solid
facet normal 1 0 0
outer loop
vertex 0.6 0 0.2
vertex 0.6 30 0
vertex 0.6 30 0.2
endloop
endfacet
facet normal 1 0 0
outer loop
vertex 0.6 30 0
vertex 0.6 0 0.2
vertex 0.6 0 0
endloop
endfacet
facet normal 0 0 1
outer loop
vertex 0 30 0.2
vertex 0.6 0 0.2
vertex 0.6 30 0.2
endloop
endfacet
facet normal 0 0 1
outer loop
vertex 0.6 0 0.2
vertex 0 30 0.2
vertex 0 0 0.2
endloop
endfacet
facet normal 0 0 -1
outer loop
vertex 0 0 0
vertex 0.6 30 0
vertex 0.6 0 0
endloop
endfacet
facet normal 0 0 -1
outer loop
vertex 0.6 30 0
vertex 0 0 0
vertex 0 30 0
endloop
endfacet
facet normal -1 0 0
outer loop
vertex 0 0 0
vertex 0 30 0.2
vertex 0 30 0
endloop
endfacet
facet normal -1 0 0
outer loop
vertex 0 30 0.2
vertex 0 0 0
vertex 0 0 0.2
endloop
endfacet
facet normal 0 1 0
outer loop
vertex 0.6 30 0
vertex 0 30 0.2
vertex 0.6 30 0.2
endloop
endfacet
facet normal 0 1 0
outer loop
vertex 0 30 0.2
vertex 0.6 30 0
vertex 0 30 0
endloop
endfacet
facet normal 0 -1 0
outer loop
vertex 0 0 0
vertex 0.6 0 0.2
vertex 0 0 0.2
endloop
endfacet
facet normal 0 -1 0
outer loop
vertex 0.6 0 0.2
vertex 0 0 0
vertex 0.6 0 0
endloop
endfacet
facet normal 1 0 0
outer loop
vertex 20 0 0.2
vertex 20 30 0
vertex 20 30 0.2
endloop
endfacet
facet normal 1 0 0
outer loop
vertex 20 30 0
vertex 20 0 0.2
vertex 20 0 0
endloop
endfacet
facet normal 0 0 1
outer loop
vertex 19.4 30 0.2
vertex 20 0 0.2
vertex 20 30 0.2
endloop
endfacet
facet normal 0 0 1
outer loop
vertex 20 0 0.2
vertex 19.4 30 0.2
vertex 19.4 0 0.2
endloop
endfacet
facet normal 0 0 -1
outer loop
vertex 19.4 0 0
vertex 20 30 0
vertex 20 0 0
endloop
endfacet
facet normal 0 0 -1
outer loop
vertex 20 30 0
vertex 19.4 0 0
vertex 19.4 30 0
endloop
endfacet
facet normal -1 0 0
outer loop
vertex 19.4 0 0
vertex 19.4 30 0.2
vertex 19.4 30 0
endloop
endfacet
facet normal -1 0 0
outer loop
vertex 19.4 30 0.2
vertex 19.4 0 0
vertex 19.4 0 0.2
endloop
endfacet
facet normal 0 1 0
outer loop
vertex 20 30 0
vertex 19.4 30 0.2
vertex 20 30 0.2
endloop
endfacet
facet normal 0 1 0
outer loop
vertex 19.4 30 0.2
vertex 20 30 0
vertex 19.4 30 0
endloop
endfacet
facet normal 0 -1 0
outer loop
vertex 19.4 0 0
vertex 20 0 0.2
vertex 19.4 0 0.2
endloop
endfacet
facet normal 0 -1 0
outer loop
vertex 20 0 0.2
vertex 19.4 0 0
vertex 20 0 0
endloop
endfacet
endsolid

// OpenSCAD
cube([0.6, 30, 0.2]);

translate([19.4, 0, 0]) cube([0.6, 30, 0.2]);
